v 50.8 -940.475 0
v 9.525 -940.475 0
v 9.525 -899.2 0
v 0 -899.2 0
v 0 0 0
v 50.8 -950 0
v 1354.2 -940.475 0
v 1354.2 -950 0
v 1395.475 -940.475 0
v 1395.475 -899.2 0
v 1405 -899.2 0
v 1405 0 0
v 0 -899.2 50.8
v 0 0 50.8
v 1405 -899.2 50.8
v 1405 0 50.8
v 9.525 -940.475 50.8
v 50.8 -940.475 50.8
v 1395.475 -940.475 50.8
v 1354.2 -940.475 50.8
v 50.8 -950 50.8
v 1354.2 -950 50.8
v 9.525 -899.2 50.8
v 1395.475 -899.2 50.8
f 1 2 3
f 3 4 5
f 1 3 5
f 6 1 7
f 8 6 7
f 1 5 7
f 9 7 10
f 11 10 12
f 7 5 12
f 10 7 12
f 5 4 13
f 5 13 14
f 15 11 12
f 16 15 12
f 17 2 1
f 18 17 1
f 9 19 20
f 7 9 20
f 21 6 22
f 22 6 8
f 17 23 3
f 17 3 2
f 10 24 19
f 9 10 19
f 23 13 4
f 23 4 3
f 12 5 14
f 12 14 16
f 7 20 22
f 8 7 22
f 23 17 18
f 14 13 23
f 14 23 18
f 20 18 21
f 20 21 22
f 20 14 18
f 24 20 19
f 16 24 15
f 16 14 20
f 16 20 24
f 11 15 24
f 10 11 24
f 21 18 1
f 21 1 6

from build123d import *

# Parameters (mm, degrees)
CROQUIS1_W              = 1405
CROQUIS1_H              = 950
SALIENTE_EXTRUIR1_DEPTH = 50.8
CORTAR_EXTRUIR1_DEPTH   = 51


with BuildPart() as part:
    # Croquis1 → Saliente-Extruir1 (new body)
    with BuildSketch(Plane.XY):
        with Locations((702.5, -475)):
            Rectangle(CROQUIS1_W, CROQUIS1_H)
    extrude(amount=SALIENTE_EXTRUIR1_DEPTH)

    # Croquis2 → Cortar-Extruir1 (cut)
    with BuildSketch(Plane.XY.offset(50.8)):
        Polygon((0, -899.2), (9.525, -899.2), (9.525, -940.475), (50.8, -940.475), (50.8, -950), (0, -950), align=None)
        Polygon((1405, -950), (1405, -899.2), (1395.475, -899.2), (1395.475, -940.475), (1354.2, -940.475), (1354.2, -950), align=None)
    extrude(amount=-CORTAR_EXTRUIR1_DEPTH, mode=Mode.SUBTRACT)


solid = part.part
